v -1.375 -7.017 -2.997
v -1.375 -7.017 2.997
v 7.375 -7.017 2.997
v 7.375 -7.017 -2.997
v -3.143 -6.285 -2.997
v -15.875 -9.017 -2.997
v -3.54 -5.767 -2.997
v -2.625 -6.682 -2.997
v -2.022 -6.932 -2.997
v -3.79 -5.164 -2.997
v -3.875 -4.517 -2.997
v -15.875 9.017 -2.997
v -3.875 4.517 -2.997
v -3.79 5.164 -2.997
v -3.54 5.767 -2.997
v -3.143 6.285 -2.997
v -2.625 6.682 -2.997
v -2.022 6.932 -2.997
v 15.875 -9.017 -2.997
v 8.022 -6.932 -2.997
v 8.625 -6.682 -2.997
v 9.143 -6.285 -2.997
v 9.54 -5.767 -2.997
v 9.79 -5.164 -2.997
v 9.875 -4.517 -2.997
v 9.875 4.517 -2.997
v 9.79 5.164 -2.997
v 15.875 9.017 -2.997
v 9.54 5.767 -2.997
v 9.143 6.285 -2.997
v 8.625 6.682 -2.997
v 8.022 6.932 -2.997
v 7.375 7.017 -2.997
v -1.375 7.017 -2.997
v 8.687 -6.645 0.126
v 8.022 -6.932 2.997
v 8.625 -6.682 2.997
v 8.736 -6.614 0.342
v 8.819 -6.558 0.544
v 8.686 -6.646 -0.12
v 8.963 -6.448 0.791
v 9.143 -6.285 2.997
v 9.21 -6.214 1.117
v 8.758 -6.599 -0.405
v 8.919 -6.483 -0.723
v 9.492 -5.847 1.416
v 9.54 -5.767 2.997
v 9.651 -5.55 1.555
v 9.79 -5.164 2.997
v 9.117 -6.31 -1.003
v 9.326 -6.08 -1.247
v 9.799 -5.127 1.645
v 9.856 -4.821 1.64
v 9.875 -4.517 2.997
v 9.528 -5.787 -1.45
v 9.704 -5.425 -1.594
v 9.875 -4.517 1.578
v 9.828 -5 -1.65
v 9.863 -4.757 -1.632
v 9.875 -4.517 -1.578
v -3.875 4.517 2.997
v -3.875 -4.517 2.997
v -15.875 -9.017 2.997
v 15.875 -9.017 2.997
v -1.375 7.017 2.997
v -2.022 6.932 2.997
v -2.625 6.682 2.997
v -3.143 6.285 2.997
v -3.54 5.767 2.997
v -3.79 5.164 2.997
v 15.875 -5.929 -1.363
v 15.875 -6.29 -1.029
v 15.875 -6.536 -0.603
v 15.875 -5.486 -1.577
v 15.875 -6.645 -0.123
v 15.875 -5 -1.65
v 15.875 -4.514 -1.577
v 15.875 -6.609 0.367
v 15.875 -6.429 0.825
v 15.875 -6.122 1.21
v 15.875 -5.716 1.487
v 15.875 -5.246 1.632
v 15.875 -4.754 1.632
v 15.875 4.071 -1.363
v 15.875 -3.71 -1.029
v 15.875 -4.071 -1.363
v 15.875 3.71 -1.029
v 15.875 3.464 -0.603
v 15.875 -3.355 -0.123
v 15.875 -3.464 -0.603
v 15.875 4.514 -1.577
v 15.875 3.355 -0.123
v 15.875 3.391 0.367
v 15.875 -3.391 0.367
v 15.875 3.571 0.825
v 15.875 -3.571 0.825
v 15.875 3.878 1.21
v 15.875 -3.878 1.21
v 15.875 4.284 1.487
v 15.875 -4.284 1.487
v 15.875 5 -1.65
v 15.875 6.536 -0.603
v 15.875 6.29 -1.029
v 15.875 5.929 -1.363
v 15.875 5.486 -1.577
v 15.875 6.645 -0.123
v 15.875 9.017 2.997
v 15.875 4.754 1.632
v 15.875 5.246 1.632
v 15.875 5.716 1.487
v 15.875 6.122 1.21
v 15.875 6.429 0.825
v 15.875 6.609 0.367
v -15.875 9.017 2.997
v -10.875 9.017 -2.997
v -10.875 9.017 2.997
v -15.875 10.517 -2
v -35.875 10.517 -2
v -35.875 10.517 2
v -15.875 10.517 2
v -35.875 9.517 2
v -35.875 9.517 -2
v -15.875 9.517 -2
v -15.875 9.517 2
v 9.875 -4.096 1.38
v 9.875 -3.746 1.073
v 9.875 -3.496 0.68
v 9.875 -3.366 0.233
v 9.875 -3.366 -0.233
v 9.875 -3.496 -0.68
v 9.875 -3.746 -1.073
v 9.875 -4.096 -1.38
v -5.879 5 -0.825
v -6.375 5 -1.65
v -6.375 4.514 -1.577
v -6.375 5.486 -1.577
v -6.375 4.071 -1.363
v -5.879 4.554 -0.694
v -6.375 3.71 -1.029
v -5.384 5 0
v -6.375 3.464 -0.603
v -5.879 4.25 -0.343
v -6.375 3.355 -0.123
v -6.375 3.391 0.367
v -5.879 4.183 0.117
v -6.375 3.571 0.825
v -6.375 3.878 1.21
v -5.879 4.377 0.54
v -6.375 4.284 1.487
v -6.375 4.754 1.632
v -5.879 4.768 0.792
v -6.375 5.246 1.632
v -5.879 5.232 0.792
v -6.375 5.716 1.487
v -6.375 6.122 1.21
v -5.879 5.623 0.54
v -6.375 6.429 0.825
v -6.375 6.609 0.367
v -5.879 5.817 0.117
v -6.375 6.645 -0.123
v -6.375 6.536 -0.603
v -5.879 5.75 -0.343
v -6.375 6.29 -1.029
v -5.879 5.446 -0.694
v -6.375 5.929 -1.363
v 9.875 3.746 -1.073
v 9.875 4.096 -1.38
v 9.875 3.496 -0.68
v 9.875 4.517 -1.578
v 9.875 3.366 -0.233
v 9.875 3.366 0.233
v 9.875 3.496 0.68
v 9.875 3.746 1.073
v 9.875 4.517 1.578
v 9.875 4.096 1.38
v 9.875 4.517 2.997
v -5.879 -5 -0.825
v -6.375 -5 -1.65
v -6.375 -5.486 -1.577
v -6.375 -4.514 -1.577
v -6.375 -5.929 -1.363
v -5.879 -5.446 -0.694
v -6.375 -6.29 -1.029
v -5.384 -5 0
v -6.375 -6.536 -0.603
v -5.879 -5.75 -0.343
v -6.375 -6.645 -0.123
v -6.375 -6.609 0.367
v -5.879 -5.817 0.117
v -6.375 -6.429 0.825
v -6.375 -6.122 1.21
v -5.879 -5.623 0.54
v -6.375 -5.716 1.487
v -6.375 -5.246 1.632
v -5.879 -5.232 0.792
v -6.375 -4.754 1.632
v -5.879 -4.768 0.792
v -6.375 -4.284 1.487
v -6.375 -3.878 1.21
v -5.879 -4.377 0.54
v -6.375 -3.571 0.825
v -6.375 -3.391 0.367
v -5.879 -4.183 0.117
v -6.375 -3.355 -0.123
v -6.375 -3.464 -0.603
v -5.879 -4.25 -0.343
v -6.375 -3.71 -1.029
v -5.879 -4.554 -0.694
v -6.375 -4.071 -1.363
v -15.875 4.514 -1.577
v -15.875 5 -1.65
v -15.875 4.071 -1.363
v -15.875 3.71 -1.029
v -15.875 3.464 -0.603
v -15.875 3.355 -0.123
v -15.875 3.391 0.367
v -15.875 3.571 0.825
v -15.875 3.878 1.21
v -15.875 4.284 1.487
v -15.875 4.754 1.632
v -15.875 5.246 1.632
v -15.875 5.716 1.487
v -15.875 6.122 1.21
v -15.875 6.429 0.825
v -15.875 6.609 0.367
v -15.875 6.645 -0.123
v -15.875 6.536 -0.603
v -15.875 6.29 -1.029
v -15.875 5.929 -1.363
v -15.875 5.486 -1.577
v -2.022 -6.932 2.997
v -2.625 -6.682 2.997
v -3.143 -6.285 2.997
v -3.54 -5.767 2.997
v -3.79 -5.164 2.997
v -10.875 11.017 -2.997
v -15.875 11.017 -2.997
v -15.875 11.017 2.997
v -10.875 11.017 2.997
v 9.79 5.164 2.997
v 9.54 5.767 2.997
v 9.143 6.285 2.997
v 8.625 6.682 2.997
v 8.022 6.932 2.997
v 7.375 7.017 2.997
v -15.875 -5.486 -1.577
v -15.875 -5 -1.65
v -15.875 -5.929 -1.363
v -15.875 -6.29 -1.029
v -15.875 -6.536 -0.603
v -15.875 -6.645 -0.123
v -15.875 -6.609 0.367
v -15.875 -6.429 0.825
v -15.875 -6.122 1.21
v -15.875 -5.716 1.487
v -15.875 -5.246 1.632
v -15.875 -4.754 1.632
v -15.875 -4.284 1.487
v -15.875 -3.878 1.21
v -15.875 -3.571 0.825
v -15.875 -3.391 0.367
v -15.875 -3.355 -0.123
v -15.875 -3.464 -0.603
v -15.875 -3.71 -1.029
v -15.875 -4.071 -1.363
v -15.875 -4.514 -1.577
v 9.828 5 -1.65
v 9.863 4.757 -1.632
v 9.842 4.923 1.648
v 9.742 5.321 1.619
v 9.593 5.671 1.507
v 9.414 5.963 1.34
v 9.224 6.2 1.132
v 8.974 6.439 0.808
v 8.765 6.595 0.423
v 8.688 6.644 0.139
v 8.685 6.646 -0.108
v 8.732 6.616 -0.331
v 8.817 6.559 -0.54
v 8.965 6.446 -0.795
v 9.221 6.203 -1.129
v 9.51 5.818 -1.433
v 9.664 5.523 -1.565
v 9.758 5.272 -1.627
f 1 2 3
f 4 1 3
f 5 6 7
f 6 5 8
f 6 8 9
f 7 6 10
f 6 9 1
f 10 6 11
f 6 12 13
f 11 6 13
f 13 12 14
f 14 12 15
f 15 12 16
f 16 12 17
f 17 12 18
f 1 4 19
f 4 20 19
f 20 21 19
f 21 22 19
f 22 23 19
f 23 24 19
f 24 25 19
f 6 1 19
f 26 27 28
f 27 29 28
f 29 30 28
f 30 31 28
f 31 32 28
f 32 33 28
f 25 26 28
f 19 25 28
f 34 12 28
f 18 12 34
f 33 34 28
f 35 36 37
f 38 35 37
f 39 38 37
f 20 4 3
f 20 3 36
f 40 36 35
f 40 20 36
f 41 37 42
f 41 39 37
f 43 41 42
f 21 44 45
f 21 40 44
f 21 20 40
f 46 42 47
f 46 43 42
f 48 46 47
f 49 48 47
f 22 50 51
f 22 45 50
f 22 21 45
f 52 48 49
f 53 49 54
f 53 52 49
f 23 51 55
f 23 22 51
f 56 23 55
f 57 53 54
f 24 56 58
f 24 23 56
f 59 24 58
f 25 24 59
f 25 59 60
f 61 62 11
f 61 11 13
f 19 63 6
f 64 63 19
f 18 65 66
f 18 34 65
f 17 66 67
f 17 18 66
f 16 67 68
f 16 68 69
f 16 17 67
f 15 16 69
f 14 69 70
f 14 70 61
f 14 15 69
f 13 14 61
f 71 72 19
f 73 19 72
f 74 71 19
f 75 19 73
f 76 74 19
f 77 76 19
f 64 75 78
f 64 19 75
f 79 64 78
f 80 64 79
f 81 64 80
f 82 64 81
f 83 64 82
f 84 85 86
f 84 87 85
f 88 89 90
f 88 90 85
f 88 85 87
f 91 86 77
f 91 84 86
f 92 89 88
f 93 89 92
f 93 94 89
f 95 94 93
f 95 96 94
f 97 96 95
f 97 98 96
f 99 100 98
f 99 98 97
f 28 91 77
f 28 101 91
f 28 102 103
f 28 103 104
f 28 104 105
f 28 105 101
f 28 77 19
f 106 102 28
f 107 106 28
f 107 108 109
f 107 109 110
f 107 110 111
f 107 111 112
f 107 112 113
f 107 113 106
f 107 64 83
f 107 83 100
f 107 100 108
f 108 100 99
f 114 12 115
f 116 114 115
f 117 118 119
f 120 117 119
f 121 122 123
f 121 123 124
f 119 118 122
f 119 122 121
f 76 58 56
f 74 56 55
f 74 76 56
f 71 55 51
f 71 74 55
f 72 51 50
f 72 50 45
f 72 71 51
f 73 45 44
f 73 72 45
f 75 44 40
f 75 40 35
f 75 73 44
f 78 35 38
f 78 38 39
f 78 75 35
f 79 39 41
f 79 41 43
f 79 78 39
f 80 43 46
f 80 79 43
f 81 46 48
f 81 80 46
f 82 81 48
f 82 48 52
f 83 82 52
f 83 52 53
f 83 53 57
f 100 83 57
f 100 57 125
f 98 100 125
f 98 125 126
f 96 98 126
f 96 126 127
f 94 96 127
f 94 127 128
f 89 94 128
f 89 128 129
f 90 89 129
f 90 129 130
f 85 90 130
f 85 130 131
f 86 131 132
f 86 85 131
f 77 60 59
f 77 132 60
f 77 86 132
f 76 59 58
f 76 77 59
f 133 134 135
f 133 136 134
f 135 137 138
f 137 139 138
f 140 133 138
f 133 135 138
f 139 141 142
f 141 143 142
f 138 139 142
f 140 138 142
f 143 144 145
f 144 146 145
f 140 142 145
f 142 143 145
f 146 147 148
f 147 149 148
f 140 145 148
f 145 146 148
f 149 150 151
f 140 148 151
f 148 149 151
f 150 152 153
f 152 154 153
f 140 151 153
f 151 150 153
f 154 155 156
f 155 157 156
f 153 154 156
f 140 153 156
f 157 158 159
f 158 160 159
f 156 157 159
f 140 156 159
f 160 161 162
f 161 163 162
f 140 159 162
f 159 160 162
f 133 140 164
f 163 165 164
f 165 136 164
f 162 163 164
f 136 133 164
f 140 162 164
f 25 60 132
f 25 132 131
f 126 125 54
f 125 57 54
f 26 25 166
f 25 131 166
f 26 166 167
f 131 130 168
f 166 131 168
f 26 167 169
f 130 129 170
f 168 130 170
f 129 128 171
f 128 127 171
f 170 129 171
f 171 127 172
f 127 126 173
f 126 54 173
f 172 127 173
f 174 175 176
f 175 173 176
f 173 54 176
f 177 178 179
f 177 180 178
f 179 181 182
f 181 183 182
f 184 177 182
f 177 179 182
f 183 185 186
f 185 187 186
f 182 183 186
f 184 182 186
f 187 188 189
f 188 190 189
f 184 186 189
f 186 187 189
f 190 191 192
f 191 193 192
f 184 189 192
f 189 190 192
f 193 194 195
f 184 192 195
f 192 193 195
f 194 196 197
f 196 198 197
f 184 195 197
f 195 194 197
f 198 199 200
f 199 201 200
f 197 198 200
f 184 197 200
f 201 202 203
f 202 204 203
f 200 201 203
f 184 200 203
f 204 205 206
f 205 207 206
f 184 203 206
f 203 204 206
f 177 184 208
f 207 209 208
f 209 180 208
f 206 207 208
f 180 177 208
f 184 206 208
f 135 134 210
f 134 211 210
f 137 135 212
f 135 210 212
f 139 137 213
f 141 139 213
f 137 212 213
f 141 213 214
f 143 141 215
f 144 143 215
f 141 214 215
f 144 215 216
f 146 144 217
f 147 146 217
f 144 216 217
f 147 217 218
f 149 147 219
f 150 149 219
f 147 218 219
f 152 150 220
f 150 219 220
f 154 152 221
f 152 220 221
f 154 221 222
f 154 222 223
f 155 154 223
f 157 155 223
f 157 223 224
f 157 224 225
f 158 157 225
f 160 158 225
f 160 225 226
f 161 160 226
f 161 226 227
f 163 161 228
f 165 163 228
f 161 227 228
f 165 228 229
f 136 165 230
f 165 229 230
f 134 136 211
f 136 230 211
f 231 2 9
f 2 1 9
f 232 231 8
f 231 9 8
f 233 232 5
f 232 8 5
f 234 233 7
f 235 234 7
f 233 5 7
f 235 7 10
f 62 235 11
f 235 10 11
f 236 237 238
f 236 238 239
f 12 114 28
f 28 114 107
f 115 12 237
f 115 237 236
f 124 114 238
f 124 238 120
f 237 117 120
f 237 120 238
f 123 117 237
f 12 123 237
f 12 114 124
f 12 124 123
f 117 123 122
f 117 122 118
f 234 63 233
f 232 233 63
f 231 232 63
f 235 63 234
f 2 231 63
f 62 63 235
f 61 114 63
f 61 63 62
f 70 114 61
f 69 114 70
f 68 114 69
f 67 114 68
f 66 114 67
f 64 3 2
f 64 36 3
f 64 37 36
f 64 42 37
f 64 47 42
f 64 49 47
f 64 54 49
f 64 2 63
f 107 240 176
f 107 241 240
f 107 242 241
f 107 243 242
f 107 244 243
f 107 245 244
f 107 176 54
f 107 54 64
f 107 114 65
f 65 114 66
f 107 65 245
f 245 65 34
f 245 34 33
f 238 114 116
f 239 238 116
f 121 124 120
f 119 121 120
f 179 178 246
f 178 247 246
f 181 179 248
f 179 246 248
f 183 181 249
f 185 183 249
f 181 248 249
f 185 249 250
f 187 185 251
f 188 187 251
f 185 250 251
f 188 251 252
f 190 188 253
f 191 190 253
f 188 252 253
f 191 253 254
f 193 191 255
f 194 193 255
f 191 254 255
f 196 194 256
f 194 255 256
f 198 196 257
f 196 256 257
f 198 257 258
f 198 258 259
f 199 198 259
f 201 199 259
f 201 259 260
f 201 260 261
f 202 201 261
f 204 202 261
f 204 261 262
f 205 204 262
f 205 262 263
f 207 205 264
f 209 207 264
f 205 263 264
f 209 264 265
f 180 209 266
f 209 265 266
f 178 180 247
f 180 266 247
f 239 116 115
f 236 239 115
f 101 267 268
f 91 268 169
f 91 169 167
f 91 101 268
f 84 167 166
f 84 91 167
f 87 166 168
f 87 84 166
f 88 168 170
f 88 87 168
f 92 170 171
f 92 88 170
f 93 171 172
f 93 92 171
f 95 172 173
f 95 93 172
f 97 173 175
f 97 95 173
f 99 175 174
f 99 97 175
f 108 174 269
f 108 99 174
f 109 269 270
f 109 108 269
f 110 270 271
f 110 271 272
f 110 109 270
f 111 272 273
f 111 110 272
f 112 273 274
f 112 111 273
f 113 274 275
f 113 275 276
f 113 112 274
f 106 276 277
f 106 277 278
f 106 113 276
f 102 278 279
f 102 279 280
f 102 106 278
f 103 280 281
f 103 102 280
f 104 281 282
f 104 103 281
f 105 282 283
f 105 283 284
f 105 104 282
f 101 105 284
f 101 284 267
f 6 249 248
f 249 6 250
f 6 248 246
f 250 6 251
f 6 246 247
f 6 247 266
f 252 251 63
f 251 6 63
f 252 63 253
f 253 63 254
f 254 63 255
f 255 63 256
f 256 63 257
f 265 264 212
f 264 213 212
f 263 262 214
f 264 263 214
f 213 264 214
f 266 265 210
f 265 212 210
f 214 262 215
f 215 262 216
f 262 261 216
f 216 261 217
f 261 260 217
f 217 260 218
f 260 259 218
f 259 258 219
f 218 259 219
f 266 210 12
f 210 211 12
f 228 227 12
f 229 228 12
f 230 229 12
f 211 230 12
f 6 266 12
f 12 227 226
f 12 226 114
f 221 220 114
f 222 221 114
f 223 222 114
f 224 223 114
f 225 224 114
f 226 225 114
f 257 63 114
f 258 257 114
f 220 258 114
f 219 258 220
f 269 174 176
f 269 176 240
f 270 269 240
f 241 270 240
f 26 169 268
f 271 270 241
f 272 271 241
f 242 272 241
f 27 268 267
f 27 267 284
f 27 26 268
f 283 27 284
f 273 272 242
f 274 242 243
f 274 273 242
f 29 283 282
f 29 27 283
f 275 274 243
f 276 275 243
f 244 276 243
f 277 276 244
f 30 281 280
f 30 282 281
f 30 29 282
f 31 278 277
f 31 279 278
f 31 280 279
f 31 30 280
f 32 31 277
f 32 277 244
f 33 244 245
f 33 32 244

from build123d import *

# Parameters (mm, degrees)
SKETCH1_W                  = 31.75
SKETCH1_H                  = 18.034
BOSS_EXTRUDE1_DEPTH        = 2.9972
SKETCH8_W                  = 13.75
SKETCH8_H                  = 14.034
CUT_EXTRUDE3_DEPTH         = 20.216002325
FILLET1_R                  = 2.5
M4_TAPPED_HOLE1_AT_2_COUNT = 2
M4_TAPPED_HOLE1_AT_2_PITCH = 10
SKETCH6_W                  = 5
SKETCH6_H                  = 5.9944
BOSS_EXTRUDE2_DEPTH        = 2
SKETCH7_W                  = 4
SKETCH7_H                  = 1
BOSS_EXTRUDE3_DEPTH        = 20


with BuildPart() as part:
    # Sketch1 → Boss-Extrude1 (new, symmetric)
    with BuildSketch(Plane.XY):
        Rectangle(SKETCH1_W, SKETCH1_H)
    extrude(amount=BOSS_EXTRUDE1_DEPTH, both=True)

    # Sketch8 → Cut-Extrude3 (cut, through all)
    with BuildSketch(Plane.XY.offset(2.9972)):
        with Locations((3, 0)):
            Rectangle(SKETCH8_W, SKETCH8_H)
    extrude(amount=-CUT_EXTRUDE3_DEPTH, mode=Mode.SUBTRACT)

    # Fillet1
    fillet1_edges = [part.edges().sort_by_distance(p)[0] for p in [
        (-3.875, -7.017, 0),
        (-3.875, 7.017, 0),
        (9.875, 7.017, 0),
        (9.875, -7.017, 0),
    ]]
    fillet(fillet1_edges, radius=FILLET1_R)

    # Sketch3 → M4 Tapped Hole1 (revolve, cut)
    with BuildSketch(Plane(origin=(15.875, 5, 0), x_dir=(0, 0, -1), z_dir=(0, 1, 0))):
        Polygon((0, 0), (0, 10.491420021), (1.65, 9.5), (1.65, 0), align=None)
    m4_tapped_hole1 = revolve(axis=Axis((22.225, 5, 0), (-1, 0, 0)), mode=Mode.SUBTRACT)

    # M4 Tapped Hole1 at 2: M4 Tapped Hole1 ×2
    with Locations(*[(0, -i * M4_TAPPED_HOLE1_AT_2_PITCH, 0) for i in range(1, M4_TAPPED_HOLE1_AT_2_COUNT)]):
        add(m4_tapped_hole1, mode=Mode.SUBTRACT)

    # Mirror1: M4 Tapped Hole1 across plane
    add(m4_tapped_hole1.mirror(Plane(origin=(0, 0, 0), x_dir=(0, 0, 1), z_dir=(1, 0, 0))), mode=Mode.SUBTRACT)

    # Mirror1 copy 1 sketch → Mirror1 copy 1 (revolve, cut)
    with BuildSketch(Plane(origin=(-15.875, -5, 0), x_dir=(0, 0, -1), z_dir=(0, 1, 0))):
        Polygon((0, 0), (0, -10.491420021), (1.65, -9.5), (1.65, 0), align=None)
    revolve(axis=Axis((-22.225, -5, 0), (-1, 0, 0)), mode=Mode.SUBTRACT)


with BuildPart() as body_2:
    # Sketch6 → Boss-Extrude2 (new body)
    with BuildSketch(Plane(origin=(0, 9.017, 0), x_dir=(1, 0, 0), z_dir=(0, 1, 0))):
        with Locations((-13.375, 0)):
            Rectangle(SKETCH6_W, SKETCH6_H)
    extrude(amount=BOSS_EXTRUDE2_DEPTH)

    # Sketch7 → Boss-Extrude3 (add)
    with BuildSketch(Plane.ZY.offset(15.875)):
        with Locations((0, 10.017)):
            Rectangle(SKETCH7_W, SKETCH7_H)
    extrude(amount=BOSS_EXTRUDE3_DEPTH)


solid = Compound([part.part, body_2.part])
